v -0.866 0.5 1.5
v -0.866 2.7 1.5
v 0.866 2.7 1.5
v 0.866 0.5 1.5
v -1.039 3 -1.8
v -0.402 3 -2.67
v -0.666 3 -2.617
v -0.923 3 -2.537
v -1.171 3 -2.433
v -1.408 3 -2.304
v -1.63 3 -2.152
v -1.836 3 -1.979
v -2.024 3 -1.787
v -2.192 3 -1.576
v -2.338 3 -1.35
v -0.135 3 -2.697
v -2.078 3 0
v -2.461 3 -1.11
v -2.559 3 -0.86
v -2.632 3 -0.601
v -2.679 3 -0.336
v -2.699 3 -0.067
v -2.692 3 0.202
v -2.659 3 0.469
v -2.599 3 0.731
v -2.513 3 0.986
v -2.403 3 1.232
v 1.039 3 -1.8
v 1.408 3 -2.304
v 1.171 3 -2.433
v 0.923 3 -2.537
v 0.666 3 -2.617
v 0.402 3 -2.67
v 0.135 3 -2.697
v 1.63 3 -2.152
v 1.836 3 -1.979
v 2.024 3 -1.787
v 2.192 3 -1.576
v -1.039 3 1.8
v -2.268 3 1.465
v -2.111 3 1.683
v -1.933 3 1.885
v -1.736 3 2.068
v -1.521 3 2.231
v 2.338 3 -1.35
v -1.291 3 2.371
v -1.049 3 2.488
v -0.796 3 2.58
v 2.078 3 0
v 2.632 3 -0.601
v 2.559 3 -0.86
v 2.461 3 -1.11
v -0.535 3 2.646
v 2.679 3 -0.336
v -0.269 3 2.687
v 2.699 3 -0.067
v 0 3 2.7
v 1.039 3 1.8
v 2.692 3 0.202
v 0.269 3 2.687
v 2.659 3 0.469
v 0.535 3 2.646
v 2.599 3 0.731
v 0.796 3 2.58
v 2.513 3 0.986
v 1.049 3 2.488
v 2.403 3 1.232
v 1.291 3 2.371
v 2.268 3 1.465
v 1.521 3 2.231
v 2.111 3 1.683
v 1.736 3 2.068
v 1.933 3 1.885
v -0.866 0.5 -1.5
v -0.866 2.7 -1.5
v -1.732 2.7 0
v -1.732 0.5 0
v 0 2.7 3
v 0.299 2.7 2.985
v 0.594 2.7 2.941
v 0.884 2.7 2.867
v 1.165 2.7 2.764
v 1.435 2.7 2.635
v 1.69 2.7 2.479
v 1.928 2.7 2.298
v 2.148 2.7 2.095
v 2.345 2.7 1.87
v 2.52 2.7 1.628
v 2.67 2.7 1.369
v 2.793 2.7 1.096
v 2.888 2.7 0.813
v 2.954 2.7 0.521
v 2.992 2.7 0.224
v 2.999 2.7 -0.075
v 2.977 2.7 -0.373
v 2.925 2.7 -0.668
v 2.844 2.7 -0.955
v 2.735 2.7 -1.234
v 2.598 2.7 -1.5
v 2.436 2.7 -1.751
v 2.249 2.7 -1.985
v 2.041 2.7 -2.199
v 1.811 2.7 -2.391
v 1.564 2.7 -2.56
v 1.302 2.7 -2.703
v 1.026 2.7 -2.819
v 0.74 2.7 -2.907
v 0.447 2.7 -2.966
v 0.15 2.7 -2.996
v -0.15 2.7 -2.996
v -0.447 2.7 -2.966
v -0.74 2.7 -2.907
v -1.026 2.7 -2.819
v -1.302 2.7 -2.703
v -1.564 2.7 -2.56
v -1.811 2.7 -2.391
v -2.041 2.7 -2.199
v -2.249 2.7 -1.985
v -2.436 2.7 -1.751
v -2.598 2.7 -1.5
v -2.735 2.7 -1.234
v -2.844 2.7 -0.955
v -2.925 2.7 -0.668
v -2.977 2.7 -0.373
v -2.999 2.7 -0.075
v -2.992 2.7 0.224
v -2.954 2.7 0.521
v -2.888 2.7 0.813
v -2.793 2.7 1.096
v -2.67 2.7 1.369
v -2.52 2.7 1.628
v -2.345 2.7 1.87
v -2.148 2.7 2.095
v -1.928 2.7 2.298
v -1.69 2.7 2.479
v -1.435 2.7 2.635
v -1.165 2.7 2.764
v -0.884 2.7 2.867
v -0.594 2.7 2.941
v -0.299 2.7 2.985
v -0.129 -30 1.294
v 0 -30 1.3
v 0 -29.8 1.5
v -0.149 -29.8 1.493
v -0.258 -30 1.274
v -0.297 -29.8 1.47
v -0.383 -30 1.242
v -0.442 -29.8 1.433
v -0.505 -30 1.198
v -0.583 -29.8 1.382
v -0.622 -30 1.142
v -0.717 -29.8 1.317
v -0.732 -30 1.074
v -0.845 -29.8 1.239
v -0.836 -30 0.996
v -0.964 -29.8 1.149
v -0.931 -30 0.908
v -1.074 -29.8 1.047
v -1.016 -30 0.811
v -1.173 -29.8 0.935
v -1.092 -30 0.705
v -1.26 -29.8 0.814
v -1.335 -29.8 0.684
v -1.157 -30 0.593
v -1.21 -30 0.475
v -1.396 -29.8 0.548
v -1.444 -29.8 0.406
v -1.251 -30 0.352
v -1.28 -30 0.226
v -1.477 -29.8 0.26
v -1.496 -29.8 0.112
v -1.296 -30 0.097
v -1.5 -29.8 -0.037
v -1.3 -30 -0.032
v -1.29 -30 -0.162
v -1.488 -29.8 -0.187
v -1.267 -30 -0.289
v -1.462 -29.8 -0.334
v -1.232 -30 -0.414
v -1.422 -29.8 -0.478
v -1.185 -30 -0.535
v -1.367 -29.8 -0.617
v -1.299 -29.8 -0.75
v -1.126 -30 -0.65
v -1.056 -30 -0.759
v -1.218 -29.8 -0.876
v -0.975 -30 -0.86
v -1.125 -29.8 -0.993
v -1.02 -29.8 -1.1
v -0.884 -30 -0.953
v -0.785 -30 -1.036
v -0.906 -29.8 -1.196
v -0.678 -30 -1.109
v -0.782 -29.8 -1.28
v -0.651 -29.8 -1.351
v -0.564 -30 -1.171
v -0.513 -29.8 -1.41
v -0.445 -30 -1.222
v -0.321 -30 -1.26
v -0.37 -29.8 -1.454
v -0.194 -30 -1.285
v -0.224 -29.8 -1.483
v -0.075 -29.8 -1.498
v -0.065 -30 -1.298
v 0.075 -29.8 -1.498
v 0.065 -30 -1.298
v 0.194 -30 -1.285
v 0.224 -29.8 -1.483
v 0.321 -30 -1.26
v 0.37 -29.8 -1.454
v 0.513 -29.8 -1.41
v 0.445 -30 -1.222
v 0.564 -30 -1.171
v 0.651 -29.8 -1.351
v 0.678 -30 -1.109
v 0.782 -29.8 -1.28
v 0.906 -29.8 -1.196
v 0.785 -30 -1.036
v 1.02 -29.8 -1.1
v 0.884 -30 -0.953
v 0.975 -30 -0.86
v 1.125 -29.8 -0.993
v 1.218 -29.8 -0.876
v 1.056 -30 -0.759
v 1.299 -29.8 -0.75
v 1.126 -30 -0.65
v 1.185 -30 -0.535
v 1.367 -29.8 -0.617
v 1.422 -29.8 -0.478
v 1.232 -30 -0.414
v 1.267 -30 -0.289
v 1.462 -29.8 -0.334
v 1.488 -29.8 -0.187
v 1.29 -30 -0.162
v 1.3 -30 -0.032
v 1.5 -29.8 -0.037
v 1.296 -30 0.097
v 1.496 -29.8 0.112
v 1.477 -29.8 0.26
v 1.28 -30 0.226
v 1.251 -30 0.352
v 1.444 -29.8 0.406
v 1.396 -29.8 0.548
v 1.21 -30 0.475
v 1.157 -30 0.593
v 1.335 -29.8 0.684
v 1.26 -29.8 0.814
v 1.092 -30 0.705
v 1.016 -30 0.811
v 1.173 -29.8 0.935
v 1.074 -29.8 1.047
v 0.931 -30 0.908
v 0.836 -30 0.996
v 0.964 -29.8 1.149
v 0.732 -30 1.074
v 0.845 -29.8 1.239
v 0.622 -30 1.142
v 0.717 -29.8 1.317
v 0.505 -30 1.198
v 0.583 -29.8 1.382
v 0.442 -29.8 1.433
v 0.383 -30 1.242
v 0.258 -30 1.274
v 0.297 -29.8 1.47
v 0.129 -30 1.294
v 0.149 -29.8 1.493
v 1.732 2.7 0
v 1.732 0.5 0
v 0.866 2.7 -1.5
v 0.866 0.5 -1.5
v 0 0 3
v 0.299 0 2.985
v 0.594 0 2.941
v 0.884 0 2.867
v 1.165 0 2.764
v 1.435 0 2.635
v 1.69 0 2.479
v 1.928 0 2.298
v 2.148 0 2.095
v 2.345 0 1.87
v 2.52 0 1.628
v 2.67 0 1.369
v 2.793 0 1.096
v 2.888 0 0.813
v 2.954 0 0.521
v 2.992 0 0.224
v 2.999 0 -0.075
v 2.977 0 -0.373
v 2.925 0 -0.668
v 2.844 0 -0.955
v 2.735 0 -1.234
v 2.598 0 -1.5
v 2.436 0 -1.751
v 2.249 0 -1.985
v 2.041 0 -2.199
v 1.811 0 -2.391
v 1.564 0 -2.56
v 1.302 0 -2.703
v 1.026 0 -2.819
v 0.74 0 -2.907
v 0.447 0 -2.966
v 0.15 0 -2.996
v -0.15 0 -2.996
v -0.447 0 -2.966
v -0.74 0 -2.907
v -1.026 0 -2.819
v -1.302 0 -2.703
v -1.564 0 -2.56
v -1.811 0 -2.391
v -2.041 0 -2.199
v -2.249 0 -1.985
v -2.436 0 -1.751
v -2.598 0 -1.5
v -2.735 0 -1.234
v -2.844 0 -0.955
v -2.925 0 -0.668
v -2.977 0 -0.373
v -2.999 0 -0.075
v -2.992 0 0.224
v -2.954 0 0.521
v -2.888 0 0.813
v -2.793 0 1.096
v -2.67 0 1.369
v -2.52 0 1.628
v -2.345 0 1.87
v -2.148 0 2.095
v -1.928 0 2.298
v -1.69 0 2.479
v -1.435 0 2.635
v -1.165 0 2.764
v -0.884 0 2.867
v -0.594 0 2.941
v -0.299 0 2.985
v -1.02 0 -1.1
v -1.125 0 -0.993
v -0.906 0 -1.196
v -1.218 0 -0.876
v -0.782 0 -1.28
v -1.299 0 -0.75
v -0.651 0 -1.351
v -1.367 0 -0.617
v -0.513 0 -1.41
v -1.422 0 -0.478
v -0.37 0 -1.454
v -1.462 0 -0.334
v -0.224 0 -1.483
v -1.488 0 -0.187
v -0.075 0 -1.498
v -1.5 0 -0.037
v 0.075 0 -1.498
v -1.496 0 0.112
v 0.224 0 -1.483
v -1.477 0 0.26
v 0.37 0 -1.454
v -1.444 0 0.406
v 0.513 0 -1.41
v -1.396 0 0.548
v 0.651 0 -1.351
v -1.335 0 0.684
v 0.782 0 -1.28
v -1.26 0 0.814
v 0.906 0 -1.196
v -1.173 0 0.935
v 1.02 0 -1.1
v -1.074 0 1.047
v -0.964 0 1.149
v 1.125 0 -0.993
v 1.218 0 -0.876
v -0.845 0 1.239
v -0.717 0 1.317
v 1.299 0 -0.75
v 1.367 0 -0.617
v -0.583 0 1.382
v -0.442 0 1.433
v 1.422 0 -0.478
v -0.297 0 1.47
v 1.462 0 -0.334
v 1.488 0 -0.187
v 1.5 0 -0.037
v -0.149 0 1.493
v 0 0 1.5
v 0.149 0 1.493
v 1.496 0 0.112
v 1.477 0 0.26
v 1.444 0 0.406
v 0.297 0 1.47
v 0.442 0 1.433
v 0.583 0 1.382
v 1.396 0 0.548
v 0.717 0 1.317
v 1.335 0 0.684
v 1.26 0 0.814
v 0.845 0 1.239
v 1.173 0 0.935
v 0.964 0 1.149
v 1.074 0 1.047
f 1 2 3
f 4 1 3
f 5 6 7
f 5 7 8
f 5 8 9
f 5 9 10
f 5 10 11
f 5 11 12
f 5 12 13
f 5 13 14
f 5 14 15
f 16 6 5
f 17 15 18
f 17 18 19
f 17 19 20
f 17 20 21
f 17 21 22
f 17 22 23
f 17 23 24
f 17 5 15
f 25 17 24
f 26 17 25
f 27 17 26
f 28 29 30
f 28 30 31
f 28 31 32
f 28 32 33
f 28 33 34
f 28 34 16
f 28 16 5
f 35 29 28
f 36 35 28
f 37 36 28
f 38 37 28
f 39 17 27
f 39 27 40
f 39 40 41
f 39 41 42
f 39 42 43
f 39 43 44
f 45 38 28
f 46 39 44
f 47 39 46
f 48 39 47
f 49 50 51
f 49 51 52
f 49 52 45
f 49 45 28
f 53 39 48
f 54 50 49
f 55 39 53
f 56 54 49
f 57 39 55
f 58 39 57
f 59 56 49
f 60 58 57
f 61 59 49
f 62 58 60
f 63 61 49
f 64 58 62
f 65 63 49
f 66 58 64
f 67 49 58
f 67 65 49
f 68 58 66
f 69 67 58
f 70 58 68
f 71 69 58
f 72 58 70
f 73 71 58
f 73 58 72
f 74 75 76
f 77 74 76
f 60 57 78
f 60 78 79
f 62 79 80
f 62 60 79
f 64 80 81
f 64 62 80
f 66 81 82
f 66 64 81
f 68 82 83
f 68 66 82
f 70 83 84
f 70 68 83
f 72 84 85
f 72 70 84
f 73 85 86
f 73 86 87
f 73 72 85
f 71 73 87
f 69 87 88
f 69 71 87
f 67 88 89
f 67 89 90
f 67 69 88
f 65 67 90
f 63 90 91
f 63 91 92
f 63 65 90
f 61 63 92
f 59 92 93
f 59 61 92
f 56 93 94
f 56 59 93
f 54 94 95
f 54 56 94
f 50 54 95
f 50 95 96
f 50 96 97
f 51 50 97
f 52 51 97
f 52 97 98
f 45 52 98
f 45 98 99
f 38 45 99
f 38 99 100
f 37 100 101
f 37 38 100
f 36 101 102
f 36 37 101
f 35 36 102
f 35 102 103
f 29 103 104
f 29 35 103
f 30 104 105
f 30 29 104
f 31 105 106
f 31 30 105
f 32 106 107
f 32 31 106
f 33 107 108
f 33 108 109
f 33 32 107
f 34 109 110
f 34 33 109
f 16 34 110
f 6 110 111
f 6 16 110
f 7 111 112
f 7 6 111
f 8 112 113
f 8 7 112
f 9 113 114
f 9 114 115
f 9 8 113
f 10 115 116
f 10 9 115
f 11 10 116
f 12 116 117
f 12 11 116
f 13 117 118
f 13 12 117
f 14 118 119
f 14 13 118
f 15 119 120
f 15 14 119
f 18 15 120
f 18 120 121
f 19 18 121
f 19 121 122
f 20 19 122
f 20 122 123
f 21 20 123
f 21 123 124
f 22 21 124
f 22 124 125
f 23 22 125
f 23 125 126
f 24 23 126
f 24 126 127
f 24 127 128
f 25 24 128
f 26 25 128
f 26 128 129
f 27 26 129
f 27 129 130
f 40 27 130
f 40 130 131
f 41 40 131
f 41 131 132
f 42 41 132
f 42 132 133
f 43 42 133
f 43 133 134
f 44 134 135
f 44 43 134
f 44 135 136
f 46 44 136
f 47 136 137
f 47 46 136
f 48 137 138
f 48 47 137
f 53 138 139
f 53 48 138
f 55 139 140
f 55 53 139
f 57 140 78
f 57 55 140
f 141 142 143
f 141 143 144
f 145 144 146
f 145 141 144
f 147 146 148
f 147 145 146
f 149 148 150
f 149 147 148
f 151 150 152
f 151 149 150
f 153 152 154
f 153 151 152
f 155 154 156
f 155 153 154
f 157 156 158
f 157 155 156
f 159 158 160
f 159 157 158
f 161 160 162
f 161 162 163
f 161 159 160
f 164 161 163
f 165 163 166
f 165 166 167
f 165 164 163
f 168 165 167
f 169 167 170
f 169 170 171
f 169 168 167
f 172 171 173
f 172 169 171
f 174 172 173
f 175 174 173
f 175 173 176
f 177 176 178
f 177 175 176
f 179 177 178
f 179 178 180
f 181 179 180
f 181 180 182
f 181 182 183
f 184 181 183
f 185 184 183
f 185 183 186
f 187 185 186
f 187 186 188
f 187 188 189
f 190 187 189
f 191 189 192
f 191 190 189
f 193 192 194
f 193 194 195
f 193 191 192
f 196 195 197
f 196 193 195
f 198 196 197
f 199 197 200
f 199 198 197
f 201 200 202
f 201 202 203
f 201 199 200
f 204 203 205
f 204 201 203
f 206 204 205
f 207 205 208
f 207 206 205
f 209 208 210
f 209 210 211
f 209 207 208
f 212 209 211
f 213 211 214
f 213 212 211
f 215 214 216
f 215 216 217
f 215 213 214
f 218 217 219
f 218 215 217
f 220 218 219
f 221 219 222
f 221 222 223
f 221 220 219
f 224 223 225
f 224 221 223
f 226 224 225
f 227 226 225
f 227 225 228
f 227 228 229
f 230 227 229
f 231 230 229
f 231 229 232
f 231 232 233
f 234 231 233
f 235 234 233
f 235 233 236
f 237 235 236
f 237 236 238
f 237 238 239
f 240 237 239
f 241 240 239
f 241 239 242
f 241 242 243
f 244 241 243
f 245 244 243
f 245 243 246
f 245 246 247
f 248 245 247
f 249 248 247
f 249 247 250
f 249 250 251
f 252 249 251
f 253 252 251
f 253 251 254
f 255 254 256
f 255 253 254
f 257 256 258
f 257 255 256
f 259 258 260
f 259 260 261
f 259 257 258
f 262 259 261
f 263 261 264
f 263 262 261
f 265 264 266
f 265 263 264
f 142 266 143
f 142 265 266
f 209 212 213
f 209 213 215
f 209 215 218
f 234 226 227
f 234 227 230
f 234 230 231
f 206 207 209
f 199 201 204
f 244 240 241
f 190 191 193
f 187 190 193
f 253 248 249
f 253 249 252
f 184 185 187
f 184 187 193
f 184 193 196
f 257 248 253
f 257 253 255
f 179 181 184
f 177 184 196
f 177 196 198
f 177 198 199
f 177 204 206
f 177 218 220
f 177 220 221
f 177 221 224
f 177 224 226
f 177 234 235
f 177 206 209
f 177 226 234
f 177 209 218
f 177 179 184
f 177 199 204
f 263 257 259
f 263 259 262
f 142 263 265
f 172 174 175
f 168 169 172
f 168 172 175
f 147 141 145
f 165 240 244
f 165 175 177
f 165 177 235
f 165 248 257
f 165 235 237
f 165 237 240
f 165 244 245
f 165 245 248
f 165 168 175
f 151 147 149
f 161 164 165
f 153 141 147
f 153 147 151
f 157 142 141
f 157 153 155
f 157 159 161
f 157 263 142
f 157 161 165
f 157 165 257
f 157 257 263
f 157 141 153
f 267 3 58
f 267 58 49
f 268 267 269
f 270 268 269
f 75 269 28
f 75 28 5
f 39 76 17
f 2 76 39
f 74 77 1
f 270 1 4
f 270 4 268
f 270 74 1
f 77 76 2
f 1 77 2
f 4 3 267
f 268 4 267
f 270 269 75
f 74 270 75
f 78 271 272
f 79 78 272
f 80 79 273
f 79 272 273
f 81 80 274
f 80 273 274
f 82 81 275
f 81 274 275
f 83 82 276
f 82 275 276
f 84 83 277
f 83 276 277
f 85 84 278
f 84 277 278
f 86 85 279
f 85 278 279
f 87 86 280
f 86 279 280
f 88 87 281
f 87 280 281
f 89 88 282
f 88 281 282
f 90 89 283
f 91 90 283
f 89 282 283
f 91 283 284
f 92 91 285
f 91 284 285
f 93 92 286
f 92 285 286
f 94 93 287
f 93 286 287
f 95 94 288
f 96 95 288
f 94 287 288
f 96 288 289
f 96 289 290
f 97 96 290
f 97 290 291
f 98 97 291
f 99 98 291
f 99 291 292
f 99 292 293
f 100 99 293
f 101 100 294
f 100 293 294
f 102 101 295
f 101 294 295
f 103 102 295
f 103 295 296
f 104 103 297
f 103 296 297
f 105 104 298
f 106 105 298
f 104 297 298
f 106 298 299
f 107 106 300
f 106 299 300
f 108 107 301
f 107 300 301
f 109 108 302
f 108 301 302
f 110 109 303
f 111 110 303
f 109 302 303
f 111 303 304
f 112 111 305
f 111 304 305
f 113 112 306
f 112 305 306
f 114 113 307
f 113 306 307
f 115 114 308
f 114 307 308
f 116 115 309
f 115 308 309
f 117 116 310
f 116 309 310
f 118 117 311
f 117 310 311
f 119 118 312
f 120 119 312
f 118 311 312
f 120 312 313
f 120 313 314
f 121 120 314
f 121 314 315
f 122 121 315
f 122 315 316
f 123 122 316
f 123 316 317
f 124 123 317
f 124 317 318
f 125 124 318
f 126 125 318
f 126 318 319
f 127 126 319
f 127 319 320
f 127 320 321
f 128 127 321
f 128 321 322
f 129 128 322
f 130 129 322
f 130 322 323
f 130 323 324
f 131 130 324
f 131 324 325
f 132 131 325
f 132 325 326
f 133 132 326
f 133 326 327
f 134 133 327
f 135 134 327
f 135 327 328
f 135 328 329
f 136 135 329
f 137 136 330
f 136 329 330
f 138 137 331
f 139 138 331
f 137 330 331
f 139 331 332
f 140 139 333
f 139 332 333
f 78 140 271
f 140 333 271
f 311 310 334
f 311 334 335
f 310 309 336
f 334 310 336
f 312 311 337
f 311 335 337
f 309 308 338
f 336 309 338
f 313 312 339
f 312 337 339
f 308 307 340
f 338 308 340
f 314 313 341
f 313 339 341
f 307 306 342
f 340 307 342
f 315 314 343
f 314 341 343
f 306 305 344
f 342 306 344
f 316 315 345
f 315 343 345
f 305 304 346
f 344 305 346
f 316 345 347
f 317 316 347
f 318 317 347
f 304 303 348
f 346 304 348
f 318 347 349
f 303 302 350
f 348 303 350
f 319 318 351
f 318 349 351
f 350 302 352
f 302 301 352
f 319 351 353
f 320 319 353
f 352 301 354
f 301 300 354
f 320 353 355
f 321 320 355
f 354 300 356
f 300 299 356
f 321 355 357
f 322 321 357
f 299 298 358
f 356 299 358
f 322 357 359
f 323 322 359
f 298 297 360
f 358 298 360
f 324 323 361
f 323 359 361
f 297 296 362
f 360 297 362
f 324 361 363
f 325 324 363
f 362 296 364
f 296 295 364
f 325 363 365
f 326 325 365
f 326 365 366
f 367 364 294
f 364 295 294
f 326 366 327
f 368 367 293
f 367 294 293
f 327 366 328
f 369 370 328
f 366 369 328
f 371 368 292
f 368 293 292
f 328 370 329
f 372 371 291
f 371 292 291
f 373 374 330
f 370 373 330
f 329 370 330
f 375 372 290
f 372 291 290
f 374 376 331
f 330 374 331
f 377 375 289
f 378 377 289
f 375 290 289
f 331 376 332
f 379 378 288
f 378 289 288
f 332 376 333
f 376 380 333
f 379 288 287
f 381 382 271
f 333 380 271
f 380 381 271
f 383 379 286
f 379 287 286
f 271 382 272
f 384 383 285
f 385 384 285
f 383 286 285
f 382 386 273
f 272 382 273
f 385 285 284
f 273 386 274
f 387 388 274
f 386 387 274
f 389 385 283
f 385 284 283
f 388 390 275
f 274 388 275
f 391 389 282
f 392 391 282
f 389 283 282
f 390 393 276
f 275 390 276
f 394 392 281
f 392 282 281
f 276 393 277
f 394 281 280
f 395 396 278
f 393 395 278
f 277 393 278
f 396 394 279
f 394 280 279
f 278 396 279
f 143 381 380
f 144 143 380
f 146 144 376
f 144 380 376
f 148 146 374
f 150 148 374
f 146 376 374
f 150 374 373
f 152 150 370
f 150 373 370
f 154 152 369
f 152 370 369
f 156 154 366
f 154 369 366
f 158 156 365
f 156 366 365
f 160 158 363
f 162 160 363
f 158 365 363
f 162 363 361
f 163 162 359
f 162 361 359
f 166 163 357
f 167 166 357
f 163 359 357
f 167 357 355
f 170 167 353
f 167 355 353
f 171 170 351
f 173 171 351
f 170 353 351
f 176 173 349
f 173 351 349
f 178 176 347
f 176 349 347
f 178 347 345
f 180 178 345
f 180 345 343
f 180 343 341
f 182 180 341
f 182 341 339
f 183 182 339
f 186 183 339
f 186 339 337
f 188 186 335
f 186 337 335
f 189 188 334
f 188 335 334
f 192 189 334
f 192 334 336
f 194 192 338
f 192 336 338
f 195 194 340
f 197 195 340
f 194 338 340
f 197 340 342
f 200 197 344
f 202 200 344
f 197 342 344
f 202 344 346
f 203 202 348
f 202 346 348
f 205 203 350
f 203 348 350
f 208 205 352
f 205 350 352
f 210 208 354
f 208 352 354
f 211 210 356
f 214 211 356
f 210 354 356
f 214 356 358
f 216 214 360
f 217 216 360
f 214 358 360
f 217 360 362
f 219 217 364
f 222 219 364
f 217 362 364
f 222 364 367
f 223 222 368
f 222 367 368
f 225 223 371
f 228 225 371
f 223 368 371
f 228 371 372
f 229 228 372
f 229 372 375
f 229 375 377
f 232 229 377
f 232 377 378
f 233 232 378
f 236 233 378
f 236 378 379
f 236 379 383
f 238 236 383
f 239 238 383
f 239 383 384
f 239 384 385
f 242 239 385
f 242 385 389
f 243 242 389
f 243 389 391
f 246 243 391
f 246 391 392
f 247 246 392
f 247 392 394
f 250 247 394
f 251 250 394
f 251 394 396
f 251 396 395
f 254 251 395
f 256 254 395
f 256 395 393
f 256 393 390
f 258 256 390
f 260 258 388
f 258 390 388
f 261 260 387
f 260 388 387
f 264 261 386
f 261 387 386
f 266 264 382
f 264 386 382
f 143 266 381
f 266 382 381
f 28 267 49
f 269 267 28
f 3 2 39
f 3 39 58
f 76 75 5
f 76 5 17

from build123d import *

# Parameters (mm, degrees)
SKETCH1_R           = 3
BOSS_EXTRUDE1_DEPTH = 3
CHAMFER1_SIZE       = 0.3
CUT_EXTRUDE1_DEPTH  = 2.5
CHAMFER2_SIZE       = 0.3
SKETCH3_R           = 1.5
BOSS_EXTRUDE2_DEPTH = 30
CHAMFER3_SIZE       = 0.2


with BuildPart() as part:
    # Sketch1 → Boss-Extrude1 (new body)
    with BuildSketch(Plane(origin=(0, 0, 0), x_dir=(1, 0, 0), z_dir=(0, 1, 0))):
        with Locations(Location((0, 0, 0), (0, 0, 270))):  # turned: the seam where the file's is
            Circle(SKETCH1_R)
    extrude(amount=BOSS_EXTRUDE1_DEPTH)

    # Chamfer1
    chamfer1_edges = [part.edges().sort_by_distance(p)[0] for p in [
        (0, 3, -3),
    ]]
    chamfer(chamfer1_edges, length=CHAMFER1_SIZE)

    # Sketch2 → Cut-Extrude1 (cut)
    with BuildSketch(Plane(origin=(0, 3, 0), x_dir=(1, 0, 0), z_dir=(0, 1, 0))):
        Polygon((1.732050808, 0), (0.866025404, 1.5), (-0.866025404, 1.5), (-1.732050808, 0), (-0.866025404, -1.5), (0.866025404, -1.5), align=None)
    extrude(amount=-CUT_EXTRUDE1_DEPTH, mode=Mode.SUBTRACT)

    # Chamfer2
    chamfer2_edges = [part.edges().sort_by_distance(p)[0] for p in [
        (1.299038106, 3, 0.75),
        (1.299038106, 3, -0.75),
        (0, 3, -1.5),
        (-1.299038106, 3, -0.75),
        (-1.299038106, 3, 0.75),
        (0, 3, 1.5),
    ]]
    chamfer(chamfer2_edges, length=CHAMFER2_SIZE)

    # Sketch3 → Boss-Extrude2 (add)
    with BuildSketch(Plane.XZ):
        with Locations(Location((0, 0, 0), (0, 0, 90))):  # turned: the seam where the file's is
            Circle(SKETCH3_R)
    extrude(amount=BOSS_EXTRUDE2_DEPTH)

    # Chamfer3
    chamfer3_edges = [part.edges().sort_by_distance(p)[0] for p in [
        (0, -30, -1.5),
    ]]
    chamfer(chamfer3_edges, length=CHAMFER3_SIZE)


solid = part.part
